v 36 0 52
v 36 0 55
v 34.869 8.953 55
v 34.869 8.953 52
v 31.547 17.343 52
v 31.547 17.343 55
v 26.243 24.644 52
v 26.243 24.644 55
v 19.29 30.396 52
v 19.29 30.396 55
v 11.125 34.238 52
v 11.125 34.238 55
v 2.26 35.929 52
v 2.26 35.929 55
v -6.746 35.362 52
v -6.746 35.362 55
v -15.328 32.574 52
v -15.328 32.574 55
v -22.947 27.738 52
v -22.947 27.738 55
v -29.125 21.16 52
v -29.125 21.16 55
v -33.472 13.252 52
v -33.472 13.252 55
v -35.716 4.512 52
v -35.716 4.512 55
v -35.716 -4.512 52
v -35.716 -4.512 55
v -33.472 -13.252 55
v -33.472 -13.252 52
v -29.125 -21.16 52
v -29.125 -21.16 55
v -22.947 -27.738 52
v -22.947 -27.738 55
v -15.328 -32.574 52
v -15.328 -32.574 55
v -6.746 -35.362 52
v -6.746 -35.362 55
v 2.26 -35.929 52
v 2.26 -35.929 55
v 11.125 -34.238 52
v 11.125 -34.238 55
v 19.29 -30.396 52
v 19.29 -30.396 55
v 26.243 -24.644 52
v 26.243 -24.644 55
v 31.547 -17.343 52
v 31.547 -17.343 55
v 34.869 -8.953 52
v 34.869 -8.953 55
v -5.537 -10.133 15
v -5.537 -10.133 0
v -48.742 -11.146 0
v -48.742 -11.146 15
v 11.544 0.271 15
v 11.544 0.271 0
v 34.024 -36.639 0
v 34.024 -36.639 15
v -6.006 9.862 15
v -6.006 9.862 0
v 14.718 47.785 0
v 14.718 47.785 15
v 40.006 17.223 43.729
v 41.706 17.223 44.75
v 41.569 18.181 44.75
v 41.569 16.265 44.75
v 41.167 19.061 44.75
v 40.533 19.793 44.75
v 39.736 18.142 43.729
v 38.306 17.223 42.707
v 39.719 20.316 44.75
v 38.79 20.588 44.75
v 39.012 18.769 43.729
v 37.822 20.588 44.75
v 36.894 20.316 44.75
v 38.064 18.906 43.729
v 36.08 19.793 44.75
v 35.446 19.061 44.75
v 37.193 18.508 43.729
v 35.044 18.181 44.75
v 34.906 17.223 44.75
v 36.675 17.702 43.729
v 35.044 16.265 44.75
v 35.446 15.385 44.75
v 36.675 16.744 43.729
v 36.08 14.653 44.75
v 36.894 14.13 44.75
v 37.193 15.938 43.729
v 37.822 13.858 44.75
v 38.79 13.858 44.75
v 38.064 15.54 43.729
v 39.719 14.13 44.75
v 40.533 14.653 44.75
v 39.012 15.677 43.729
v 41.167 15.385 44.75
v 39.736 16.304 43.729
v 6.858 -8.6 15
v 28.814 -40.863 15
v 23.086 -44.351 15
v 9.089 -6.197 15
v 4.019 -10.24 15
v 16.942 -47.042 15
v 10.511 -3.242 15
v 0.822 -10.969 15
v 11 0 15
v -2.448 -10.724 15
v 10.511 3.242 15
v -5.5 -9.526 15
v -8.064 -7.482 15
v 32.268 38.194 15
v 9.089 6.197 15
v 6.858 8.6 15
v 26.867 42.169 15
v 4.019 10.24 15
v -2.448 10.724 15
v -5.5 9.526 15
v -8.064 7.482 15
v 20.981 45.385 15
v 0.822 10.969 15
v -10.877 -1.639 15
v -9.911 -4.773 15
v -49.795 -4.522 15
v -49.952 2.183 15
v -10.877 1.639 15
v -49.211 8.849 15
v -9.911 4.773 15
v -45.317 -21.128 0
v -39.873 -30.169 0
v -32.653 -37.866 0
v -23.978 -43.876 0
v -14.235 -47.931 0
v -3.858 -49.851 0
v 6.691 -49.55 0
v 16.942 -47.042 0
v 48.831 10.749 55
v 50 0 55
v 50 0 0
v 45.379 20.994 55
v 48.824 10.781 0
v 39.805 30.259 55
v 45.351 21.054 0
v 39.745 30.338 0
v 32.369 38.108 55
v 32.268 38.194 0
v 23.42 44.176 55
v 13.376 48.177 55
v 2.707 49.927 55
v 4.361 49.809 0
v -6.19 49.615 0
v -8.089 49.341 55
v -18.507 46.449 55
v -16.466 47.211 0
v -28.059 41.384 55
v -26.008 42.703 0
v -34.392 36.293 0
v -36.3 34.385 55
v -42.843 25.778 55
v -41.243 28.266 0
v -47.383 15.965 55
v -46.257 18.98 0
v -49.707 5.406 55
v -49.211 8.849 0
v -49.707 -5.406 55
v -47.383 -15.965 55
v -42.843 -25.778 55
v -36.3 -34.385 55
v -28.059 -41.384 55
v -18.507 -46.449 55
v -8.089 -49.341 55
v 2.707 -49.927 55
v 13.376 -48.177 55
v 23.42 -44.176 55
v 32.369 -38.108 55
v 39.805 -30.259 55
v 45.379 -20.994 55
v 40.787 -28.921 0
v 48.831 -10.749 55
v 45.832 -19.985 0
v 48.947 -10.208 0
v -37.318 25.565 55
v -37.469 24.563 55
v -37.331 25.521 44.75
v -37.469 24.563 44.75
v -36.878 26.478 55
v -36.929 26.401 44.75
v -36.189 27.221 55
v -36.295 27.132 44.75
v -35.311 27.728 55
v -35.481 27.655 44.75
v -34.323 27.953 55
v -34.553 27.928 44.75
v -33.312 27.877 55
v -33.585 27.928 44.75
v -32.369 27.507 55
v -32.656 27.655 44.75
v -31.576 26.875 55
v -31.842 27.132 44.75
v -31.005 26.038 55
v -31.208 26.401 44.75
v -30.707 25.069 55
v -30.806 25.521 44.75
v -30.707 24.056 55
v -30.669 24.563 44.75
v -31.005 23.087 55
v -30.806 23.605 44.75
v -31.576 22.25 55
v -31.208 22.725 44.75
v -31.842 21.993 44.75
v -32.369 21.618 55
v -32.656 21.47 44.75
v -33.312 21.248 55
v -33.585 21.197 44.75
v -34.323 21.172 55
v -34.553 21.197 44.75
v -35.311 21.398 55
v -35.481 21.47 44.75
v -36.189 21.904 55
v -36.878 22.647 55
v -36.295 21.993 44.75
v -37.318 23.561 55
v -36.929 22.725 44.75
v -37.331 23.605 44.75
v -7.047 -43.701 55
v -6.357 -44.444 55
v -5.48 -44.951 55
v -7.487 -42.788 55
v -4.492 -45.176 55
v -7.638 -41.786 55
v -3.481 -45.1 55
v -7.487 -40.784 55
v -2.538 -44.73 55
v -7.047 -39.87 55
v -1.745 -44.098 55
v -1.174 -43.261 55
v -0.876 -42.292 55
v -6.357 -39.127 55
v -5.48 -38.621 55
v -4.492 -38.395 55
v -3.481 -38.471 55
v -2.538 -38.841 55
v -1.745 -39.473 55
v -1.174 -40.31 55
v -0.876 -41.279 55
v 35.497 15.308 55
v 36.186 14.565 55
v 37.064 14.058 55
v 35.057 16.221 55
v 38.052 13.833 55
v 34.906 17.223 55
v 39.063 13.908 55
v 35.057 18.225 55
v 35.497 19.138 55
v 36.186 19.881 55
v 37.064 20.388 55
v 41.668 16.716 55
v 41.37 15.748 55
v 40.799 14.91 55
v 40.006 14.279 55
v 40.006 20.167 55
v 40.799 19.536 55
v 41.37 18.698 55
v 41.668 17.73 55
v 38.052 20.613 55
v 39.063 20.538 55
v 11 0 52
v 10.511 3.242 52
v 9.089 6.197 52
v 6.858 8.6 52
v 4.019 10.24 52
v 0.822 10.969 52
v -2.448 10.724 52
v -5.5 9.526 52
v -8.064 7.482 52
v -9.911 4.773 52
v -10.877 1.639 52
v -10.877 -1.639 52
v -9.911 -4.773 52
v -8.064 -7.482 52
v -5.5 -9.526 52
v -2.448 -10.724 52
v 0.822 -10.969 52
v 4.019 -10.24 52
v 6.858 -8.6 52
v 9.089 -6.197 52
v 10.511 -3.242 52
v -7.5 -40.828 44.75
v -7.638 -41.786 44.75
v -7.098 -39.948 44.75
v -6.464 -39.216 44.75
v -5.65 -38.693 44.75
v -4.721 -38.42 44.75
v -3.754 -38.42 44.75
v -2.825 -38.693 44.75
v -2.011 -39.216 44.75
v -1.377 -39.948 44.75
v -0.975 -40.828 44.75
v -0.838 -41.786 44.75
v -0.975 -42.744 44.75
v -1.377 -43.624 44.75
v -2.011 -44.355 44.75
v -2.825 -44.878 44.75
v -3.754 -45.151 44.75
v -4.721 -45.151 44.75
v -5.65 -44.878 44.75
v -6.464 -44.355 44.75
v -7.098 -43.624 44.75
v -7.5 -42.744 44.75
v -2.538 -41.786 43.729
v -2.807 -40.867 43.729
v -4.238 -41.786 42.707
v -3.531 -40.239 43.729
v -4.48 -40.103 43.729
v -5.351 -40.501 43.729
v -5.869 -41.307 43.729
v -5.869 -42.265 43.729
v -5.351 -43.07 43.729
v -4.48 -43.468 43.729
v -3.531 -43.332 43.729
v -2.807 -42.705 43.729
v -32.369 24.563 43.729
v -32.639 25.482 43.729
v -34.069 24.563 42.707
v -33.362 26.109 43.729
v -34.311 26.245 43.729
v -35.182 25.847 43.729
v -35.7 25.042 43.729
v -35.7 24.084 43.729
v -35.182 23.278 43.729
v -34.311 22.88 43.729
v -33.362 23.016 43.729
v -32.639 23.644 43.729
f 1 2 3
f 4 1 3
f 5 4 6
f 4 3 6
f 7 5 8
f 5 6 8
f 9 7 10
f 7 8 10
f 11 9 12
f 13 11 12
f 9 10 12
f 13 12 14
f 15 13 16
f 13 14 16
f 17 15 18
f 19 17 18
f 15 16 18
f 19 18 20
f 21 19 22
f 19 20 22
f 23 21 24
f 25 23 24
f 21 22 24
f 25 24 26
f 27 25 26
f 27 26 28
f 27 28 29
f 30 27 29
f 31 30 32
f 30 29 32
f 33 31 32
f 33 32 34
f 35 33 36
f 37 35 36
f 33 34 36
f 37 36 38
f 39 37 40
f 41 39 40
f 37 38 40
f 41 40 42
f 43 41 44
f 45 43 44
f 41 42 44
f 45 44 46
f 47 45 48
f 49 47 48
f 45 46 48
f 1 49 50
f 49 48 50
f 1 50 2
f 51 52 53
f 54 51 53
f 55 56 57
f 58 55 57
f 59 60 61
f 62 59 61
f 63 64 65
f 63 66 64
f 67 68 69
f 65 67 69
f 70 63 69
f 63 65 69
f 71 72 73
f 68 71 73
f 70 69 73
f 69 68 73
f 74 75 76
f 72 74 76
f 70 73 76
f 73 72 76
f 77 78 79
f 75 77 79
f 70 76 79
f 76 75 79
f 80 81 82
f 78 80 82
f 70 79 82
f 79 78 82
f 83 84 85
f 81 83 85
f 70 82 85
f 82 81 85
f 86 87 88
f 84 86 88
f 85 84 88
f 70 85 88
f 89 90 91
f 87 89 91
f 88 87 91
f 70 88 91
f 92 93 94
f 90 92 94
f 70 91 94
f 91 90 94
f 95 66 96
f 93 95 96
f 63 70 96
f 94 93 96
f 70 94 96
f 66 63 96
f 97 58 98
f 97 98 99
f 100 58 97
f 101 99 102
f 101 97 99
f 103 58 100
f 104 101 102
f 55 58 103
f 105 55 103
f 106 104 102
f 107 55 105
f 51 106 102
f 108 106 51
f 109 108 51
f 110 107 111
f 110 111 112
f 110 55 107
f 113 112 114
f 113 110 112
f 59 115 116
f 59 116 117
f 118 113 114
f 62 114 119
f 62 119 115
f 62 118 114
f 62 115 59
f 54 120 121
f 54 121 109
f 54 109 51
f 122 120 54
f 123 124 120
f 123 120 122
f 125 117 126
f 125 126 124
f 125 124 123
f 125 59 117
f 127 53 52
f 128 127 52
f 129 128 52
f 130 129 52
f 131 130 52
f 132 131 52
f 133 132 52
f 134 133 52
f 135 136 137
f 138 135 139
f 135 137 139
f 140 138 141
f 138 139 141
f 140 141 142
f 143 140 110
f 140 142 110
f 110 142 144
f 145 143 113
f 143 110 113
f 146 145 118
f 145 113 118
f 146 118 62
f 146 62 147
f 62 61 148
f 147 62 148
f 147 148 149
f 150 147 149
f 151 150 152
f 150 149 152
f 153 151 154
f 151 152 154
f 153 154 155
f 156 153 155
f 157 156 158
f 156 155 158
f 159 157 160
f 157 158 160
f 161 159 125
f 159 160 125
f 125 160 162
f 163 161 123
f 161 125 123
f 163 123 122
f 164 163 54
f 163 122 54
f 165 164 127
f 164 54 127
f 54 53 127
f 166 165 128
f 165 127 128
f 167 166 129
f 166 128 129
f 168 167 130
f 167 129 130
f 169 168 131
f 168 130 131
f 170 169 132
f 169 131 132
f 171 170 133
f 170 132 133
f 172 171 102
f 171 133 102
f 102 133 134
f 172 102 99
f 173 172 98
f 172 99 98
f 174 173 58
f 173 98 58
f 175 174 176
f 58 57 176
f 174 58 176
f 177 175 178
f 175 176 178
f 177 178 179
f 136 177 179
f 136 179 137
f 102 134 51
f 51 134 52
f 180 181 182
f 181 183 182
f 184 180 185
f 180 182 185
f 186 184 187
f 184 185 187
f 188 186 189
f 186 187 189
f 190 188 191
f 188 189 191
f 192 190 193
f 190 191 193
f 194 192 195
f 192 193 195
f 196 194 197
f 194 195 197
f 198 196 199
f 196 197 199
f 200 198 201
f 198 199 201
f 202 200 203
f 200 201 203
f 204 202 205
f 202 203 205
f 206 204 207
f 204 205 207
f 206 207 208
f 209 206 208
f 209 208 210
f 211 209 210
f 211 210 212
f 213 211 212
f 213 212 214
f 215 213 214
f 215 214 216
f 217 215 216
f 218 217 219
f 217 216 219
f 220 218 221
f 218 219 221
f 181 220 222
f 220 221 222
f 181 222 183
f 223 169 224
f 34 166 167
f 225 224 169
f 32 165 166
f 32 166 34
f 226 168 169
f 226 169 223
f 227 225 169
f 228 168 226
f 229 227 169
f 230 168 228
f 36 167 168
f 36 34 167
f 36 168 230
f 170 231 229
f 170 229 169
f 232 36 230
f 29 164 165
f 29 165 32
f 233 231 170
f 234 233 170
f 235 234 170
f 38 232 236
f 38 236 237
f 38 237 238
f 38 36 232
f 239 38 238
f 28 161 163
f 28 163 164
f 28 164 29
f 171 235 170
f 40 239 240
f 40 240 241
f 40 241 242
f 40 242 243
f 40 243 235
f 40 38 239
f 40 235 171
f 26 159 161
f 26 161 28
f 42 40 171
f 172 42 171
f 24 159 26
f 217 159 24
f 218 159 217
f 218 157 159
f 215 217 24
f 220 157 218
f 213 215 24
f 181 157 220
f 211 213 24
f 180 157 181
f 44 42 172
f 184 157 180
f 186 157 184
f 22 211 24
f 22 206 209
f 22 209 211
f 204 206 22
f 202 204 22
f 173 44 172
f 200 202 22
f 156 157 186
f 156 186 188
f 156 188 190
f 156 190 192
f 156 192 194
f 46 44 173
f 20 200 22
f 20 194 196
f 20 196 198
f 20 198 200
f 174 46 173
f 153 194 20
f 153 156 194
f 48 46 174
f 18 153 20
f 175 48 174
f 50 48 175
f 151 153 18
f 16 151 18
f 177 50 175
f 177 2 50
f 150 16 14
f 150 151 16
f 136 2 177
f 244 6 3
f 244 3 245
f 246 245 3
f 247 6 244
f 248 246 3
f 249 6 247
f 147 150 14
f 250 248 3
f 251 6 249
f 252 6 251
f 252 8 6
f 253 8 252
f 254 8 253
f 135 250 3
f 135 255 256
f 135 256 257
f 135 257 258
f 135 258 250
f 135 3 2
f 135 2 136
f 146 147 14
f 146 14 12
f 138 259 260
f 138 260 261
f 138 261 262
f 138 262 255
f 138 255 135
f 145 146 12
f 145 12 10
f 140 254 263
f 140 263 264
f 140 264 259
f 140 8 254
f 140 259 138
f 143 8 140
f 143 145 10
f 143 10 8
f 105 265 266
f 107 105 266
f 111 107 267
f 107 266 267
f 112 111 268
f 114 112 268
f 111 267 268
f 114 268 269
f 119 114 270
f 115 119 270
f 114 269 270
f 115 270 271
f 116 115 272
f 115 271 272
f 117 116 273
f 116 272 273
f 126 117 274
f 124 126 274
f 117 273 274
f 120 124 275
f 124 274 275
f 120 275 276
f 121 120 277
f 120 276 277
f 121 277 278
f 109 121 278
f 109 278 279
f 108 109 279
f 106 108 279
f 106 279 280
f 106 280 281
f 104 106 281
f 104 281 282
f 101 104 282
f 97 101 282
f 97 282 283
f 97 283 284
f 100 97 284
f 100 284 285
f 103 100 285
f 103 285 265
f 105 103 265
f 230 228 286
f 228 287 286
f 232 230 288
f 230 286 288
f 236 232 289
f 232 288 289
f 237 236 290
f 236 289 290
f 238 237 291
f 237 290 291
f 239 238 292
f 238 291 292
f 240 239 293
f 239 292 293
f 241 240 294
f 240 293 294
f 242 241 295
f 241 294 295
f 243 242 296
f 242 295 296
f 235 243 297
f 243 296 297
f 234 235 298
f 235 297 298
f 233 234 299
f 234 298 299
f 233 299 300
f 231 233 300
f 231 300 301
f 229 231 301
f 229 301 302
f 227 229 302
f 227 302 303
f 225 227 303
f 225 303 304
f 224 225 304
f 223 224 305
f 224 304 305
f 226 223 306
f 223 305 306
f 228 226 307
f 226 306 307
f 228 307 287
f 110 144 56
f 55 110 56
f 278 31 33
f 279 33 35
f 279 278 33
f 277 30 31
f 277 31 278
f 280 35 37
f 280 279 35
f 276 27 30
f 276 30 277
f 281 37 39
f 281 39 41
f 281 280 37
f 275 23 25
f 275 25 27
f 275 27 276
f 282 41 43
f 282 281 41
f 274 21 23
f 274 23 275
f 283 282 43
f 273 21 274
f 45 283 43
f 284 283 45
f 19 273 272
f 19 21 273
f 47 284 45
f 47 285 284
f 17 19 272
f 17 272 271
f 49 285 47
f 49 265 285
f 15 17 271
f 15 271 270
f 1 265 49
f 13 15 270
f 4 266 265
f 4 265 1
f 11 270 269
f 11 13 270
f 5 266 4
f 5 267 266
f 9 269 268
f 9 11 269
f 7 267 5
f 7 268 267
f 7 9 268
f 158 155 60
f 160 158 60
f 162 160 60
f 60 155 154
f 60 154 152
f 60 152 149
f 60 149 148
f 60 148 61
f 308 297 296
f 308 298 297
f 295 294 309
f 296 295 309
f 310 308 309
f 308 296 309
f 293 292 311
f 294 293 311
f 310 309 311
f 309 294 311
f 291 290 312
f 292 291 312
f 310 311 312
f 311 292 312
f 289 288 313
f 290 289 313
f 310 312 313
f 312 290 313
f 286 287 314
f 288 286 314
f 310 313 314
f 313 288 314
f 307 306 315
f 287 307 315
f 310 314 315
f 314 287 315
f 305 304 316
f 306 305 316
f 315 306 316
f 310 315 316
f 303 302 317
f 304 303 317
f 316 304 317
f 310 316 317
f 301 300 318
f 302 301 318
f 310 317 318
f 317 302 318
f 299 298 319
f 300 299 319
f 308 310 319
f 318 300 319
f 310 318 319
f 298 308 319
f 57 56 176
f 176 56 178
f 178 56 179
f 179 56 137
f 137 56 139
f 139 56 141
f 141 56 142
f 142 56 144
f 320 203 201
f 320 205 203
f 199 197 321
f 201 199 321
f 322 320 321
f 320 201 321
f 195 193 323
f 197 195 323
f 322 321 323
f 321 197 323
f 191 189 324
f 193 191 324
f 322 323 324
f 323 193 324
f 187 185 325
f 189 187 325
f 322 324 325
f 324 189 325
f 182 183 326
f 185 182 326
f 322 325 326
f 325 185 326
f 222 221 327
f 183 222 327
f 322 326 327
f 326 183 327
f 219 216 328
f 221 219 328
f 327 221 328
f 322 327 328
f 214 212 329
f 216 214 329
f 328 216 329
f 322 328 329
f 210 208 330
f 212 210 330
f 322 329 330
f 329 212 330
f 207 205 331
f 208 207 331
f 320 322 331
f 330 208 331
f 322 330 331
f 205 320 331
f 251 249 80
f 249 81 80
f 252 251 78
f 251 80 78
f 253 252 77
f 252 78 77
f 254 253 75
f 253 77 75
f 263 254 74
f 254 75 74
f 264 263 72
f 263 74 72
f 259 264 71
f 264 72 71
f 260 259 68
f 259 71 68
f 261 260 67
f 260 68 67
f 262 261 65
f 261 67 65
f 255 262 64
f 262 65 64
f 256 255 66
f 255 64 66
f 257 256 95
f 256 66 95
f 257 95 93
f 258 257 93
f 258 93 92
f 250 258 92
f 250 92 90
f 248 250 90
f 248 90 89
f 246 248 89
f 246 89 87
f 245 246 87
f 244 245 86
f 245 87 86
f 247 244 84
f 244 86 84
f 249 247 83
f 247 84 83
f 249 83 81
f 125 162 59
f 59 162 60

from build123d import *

# Parameters (mm, degrees)
SKETCH1_R                  = 50
BOSS_EXTRUDE1_DEPTH        = 55
SKETCH2_R                  = 36
CUT_EXTRUDE1_DEPTH         = 3
CUT_EXTRUDE2_REACH         = 89.772
SKETCH3_R                  = 11
M8X1_25_TAPPED_HOLE1_D     = 6.8
M8X1_25_TAPPED_HOLE1_DEPTH = 10.25
M8X1_25_TAPPED_HOLE1_TIP   = 2.042926105
CUT_EXTRUDE3_DEPTH         = 15


with BuildPart() as part:
    # Sketch1 → Boss-Extrude1 (new body)
    with BuildSketch(Plane.XY):
        Circle(SKETCH1_R)
    extrude(amount=BOSS_EXTRUDE1_DEPTH)

    # Sketch2 → Cut-Extrude1 (cut)
    with BuildSketch(Plane.XY.offset(55)):
        Circle(SKETCH2_R)
    extrude(amount=-CUT_EXTRUDE1_DEPTH, mode=Mode.SUBTRACT)

    # Sketch3 → Cut-Extrude2 (cut, up to next)
    with BuildSketch(Plane.XY.offset(52), mode=Mode.PRIVATE) as cut_extrude2_sk1:
        Circle(SKETCH3_R)
    cut_extrude2_tool1 = extrude(cut_extrude2_sk1.sketch, amount=-CUT_EXTRUDE2_REACH, mode=Mode.PRIVATE) & part.part
    add(cut_extrude2_tool1.solids().sort_by_distance((0, 0, 52))[0], mode=Mode.SUBTRACT)

    # M8x1.25 Tapped Hole1
    with Locations(Plane.XY.offset(55)):
        with Locations((-34.068677595, 24.562679147), (38.306242924, 17.223000697), (-4.237565329, -41.785679845), (0, 0)):
            Hole(M8X1_25_TAPPED_HOLE1_D / 2, depth=M8X1_25_TAPPED_HOLE1_DEPTH)
            with Locations((0, 0, -(M8X1_25_TAPPED_HOLE1_DEPTH + M8X1_25_TAPPED_HOLE1_TIP / 2))):  # 118° drill point
                Cone(0, M8X1_25_TAPPED_HOLE1_D / 2, M8X1_25_TAPPED_HOLE1_TIP, mode=Mode.SUBTRACT)

    # Sketch7 → Cut-Extrude3 (cut)
    with BuildSketch(Plane(origin=(0, 0, 0), x_dir=(-1, 0, 0), z_dir=(0, 0, -1))):
        Polygon((-56.730768418, 82.955529741), (-11.543830818, 0.270745983), (-60.557485259, -80.204681778), (-43.476211931, -90.608051497), (5.53744251, -10.132623736), (99.738034552, -12.341979735), (100.20698035, 7.652521756), (6.006388308, 9.861877754), (-39.180549293, 92.546661513), align=None)
    extrude(amount=-CUT_EXTRUDE3_DEPTH, mode=Mode.SUBTRACT)


solid = part.part
